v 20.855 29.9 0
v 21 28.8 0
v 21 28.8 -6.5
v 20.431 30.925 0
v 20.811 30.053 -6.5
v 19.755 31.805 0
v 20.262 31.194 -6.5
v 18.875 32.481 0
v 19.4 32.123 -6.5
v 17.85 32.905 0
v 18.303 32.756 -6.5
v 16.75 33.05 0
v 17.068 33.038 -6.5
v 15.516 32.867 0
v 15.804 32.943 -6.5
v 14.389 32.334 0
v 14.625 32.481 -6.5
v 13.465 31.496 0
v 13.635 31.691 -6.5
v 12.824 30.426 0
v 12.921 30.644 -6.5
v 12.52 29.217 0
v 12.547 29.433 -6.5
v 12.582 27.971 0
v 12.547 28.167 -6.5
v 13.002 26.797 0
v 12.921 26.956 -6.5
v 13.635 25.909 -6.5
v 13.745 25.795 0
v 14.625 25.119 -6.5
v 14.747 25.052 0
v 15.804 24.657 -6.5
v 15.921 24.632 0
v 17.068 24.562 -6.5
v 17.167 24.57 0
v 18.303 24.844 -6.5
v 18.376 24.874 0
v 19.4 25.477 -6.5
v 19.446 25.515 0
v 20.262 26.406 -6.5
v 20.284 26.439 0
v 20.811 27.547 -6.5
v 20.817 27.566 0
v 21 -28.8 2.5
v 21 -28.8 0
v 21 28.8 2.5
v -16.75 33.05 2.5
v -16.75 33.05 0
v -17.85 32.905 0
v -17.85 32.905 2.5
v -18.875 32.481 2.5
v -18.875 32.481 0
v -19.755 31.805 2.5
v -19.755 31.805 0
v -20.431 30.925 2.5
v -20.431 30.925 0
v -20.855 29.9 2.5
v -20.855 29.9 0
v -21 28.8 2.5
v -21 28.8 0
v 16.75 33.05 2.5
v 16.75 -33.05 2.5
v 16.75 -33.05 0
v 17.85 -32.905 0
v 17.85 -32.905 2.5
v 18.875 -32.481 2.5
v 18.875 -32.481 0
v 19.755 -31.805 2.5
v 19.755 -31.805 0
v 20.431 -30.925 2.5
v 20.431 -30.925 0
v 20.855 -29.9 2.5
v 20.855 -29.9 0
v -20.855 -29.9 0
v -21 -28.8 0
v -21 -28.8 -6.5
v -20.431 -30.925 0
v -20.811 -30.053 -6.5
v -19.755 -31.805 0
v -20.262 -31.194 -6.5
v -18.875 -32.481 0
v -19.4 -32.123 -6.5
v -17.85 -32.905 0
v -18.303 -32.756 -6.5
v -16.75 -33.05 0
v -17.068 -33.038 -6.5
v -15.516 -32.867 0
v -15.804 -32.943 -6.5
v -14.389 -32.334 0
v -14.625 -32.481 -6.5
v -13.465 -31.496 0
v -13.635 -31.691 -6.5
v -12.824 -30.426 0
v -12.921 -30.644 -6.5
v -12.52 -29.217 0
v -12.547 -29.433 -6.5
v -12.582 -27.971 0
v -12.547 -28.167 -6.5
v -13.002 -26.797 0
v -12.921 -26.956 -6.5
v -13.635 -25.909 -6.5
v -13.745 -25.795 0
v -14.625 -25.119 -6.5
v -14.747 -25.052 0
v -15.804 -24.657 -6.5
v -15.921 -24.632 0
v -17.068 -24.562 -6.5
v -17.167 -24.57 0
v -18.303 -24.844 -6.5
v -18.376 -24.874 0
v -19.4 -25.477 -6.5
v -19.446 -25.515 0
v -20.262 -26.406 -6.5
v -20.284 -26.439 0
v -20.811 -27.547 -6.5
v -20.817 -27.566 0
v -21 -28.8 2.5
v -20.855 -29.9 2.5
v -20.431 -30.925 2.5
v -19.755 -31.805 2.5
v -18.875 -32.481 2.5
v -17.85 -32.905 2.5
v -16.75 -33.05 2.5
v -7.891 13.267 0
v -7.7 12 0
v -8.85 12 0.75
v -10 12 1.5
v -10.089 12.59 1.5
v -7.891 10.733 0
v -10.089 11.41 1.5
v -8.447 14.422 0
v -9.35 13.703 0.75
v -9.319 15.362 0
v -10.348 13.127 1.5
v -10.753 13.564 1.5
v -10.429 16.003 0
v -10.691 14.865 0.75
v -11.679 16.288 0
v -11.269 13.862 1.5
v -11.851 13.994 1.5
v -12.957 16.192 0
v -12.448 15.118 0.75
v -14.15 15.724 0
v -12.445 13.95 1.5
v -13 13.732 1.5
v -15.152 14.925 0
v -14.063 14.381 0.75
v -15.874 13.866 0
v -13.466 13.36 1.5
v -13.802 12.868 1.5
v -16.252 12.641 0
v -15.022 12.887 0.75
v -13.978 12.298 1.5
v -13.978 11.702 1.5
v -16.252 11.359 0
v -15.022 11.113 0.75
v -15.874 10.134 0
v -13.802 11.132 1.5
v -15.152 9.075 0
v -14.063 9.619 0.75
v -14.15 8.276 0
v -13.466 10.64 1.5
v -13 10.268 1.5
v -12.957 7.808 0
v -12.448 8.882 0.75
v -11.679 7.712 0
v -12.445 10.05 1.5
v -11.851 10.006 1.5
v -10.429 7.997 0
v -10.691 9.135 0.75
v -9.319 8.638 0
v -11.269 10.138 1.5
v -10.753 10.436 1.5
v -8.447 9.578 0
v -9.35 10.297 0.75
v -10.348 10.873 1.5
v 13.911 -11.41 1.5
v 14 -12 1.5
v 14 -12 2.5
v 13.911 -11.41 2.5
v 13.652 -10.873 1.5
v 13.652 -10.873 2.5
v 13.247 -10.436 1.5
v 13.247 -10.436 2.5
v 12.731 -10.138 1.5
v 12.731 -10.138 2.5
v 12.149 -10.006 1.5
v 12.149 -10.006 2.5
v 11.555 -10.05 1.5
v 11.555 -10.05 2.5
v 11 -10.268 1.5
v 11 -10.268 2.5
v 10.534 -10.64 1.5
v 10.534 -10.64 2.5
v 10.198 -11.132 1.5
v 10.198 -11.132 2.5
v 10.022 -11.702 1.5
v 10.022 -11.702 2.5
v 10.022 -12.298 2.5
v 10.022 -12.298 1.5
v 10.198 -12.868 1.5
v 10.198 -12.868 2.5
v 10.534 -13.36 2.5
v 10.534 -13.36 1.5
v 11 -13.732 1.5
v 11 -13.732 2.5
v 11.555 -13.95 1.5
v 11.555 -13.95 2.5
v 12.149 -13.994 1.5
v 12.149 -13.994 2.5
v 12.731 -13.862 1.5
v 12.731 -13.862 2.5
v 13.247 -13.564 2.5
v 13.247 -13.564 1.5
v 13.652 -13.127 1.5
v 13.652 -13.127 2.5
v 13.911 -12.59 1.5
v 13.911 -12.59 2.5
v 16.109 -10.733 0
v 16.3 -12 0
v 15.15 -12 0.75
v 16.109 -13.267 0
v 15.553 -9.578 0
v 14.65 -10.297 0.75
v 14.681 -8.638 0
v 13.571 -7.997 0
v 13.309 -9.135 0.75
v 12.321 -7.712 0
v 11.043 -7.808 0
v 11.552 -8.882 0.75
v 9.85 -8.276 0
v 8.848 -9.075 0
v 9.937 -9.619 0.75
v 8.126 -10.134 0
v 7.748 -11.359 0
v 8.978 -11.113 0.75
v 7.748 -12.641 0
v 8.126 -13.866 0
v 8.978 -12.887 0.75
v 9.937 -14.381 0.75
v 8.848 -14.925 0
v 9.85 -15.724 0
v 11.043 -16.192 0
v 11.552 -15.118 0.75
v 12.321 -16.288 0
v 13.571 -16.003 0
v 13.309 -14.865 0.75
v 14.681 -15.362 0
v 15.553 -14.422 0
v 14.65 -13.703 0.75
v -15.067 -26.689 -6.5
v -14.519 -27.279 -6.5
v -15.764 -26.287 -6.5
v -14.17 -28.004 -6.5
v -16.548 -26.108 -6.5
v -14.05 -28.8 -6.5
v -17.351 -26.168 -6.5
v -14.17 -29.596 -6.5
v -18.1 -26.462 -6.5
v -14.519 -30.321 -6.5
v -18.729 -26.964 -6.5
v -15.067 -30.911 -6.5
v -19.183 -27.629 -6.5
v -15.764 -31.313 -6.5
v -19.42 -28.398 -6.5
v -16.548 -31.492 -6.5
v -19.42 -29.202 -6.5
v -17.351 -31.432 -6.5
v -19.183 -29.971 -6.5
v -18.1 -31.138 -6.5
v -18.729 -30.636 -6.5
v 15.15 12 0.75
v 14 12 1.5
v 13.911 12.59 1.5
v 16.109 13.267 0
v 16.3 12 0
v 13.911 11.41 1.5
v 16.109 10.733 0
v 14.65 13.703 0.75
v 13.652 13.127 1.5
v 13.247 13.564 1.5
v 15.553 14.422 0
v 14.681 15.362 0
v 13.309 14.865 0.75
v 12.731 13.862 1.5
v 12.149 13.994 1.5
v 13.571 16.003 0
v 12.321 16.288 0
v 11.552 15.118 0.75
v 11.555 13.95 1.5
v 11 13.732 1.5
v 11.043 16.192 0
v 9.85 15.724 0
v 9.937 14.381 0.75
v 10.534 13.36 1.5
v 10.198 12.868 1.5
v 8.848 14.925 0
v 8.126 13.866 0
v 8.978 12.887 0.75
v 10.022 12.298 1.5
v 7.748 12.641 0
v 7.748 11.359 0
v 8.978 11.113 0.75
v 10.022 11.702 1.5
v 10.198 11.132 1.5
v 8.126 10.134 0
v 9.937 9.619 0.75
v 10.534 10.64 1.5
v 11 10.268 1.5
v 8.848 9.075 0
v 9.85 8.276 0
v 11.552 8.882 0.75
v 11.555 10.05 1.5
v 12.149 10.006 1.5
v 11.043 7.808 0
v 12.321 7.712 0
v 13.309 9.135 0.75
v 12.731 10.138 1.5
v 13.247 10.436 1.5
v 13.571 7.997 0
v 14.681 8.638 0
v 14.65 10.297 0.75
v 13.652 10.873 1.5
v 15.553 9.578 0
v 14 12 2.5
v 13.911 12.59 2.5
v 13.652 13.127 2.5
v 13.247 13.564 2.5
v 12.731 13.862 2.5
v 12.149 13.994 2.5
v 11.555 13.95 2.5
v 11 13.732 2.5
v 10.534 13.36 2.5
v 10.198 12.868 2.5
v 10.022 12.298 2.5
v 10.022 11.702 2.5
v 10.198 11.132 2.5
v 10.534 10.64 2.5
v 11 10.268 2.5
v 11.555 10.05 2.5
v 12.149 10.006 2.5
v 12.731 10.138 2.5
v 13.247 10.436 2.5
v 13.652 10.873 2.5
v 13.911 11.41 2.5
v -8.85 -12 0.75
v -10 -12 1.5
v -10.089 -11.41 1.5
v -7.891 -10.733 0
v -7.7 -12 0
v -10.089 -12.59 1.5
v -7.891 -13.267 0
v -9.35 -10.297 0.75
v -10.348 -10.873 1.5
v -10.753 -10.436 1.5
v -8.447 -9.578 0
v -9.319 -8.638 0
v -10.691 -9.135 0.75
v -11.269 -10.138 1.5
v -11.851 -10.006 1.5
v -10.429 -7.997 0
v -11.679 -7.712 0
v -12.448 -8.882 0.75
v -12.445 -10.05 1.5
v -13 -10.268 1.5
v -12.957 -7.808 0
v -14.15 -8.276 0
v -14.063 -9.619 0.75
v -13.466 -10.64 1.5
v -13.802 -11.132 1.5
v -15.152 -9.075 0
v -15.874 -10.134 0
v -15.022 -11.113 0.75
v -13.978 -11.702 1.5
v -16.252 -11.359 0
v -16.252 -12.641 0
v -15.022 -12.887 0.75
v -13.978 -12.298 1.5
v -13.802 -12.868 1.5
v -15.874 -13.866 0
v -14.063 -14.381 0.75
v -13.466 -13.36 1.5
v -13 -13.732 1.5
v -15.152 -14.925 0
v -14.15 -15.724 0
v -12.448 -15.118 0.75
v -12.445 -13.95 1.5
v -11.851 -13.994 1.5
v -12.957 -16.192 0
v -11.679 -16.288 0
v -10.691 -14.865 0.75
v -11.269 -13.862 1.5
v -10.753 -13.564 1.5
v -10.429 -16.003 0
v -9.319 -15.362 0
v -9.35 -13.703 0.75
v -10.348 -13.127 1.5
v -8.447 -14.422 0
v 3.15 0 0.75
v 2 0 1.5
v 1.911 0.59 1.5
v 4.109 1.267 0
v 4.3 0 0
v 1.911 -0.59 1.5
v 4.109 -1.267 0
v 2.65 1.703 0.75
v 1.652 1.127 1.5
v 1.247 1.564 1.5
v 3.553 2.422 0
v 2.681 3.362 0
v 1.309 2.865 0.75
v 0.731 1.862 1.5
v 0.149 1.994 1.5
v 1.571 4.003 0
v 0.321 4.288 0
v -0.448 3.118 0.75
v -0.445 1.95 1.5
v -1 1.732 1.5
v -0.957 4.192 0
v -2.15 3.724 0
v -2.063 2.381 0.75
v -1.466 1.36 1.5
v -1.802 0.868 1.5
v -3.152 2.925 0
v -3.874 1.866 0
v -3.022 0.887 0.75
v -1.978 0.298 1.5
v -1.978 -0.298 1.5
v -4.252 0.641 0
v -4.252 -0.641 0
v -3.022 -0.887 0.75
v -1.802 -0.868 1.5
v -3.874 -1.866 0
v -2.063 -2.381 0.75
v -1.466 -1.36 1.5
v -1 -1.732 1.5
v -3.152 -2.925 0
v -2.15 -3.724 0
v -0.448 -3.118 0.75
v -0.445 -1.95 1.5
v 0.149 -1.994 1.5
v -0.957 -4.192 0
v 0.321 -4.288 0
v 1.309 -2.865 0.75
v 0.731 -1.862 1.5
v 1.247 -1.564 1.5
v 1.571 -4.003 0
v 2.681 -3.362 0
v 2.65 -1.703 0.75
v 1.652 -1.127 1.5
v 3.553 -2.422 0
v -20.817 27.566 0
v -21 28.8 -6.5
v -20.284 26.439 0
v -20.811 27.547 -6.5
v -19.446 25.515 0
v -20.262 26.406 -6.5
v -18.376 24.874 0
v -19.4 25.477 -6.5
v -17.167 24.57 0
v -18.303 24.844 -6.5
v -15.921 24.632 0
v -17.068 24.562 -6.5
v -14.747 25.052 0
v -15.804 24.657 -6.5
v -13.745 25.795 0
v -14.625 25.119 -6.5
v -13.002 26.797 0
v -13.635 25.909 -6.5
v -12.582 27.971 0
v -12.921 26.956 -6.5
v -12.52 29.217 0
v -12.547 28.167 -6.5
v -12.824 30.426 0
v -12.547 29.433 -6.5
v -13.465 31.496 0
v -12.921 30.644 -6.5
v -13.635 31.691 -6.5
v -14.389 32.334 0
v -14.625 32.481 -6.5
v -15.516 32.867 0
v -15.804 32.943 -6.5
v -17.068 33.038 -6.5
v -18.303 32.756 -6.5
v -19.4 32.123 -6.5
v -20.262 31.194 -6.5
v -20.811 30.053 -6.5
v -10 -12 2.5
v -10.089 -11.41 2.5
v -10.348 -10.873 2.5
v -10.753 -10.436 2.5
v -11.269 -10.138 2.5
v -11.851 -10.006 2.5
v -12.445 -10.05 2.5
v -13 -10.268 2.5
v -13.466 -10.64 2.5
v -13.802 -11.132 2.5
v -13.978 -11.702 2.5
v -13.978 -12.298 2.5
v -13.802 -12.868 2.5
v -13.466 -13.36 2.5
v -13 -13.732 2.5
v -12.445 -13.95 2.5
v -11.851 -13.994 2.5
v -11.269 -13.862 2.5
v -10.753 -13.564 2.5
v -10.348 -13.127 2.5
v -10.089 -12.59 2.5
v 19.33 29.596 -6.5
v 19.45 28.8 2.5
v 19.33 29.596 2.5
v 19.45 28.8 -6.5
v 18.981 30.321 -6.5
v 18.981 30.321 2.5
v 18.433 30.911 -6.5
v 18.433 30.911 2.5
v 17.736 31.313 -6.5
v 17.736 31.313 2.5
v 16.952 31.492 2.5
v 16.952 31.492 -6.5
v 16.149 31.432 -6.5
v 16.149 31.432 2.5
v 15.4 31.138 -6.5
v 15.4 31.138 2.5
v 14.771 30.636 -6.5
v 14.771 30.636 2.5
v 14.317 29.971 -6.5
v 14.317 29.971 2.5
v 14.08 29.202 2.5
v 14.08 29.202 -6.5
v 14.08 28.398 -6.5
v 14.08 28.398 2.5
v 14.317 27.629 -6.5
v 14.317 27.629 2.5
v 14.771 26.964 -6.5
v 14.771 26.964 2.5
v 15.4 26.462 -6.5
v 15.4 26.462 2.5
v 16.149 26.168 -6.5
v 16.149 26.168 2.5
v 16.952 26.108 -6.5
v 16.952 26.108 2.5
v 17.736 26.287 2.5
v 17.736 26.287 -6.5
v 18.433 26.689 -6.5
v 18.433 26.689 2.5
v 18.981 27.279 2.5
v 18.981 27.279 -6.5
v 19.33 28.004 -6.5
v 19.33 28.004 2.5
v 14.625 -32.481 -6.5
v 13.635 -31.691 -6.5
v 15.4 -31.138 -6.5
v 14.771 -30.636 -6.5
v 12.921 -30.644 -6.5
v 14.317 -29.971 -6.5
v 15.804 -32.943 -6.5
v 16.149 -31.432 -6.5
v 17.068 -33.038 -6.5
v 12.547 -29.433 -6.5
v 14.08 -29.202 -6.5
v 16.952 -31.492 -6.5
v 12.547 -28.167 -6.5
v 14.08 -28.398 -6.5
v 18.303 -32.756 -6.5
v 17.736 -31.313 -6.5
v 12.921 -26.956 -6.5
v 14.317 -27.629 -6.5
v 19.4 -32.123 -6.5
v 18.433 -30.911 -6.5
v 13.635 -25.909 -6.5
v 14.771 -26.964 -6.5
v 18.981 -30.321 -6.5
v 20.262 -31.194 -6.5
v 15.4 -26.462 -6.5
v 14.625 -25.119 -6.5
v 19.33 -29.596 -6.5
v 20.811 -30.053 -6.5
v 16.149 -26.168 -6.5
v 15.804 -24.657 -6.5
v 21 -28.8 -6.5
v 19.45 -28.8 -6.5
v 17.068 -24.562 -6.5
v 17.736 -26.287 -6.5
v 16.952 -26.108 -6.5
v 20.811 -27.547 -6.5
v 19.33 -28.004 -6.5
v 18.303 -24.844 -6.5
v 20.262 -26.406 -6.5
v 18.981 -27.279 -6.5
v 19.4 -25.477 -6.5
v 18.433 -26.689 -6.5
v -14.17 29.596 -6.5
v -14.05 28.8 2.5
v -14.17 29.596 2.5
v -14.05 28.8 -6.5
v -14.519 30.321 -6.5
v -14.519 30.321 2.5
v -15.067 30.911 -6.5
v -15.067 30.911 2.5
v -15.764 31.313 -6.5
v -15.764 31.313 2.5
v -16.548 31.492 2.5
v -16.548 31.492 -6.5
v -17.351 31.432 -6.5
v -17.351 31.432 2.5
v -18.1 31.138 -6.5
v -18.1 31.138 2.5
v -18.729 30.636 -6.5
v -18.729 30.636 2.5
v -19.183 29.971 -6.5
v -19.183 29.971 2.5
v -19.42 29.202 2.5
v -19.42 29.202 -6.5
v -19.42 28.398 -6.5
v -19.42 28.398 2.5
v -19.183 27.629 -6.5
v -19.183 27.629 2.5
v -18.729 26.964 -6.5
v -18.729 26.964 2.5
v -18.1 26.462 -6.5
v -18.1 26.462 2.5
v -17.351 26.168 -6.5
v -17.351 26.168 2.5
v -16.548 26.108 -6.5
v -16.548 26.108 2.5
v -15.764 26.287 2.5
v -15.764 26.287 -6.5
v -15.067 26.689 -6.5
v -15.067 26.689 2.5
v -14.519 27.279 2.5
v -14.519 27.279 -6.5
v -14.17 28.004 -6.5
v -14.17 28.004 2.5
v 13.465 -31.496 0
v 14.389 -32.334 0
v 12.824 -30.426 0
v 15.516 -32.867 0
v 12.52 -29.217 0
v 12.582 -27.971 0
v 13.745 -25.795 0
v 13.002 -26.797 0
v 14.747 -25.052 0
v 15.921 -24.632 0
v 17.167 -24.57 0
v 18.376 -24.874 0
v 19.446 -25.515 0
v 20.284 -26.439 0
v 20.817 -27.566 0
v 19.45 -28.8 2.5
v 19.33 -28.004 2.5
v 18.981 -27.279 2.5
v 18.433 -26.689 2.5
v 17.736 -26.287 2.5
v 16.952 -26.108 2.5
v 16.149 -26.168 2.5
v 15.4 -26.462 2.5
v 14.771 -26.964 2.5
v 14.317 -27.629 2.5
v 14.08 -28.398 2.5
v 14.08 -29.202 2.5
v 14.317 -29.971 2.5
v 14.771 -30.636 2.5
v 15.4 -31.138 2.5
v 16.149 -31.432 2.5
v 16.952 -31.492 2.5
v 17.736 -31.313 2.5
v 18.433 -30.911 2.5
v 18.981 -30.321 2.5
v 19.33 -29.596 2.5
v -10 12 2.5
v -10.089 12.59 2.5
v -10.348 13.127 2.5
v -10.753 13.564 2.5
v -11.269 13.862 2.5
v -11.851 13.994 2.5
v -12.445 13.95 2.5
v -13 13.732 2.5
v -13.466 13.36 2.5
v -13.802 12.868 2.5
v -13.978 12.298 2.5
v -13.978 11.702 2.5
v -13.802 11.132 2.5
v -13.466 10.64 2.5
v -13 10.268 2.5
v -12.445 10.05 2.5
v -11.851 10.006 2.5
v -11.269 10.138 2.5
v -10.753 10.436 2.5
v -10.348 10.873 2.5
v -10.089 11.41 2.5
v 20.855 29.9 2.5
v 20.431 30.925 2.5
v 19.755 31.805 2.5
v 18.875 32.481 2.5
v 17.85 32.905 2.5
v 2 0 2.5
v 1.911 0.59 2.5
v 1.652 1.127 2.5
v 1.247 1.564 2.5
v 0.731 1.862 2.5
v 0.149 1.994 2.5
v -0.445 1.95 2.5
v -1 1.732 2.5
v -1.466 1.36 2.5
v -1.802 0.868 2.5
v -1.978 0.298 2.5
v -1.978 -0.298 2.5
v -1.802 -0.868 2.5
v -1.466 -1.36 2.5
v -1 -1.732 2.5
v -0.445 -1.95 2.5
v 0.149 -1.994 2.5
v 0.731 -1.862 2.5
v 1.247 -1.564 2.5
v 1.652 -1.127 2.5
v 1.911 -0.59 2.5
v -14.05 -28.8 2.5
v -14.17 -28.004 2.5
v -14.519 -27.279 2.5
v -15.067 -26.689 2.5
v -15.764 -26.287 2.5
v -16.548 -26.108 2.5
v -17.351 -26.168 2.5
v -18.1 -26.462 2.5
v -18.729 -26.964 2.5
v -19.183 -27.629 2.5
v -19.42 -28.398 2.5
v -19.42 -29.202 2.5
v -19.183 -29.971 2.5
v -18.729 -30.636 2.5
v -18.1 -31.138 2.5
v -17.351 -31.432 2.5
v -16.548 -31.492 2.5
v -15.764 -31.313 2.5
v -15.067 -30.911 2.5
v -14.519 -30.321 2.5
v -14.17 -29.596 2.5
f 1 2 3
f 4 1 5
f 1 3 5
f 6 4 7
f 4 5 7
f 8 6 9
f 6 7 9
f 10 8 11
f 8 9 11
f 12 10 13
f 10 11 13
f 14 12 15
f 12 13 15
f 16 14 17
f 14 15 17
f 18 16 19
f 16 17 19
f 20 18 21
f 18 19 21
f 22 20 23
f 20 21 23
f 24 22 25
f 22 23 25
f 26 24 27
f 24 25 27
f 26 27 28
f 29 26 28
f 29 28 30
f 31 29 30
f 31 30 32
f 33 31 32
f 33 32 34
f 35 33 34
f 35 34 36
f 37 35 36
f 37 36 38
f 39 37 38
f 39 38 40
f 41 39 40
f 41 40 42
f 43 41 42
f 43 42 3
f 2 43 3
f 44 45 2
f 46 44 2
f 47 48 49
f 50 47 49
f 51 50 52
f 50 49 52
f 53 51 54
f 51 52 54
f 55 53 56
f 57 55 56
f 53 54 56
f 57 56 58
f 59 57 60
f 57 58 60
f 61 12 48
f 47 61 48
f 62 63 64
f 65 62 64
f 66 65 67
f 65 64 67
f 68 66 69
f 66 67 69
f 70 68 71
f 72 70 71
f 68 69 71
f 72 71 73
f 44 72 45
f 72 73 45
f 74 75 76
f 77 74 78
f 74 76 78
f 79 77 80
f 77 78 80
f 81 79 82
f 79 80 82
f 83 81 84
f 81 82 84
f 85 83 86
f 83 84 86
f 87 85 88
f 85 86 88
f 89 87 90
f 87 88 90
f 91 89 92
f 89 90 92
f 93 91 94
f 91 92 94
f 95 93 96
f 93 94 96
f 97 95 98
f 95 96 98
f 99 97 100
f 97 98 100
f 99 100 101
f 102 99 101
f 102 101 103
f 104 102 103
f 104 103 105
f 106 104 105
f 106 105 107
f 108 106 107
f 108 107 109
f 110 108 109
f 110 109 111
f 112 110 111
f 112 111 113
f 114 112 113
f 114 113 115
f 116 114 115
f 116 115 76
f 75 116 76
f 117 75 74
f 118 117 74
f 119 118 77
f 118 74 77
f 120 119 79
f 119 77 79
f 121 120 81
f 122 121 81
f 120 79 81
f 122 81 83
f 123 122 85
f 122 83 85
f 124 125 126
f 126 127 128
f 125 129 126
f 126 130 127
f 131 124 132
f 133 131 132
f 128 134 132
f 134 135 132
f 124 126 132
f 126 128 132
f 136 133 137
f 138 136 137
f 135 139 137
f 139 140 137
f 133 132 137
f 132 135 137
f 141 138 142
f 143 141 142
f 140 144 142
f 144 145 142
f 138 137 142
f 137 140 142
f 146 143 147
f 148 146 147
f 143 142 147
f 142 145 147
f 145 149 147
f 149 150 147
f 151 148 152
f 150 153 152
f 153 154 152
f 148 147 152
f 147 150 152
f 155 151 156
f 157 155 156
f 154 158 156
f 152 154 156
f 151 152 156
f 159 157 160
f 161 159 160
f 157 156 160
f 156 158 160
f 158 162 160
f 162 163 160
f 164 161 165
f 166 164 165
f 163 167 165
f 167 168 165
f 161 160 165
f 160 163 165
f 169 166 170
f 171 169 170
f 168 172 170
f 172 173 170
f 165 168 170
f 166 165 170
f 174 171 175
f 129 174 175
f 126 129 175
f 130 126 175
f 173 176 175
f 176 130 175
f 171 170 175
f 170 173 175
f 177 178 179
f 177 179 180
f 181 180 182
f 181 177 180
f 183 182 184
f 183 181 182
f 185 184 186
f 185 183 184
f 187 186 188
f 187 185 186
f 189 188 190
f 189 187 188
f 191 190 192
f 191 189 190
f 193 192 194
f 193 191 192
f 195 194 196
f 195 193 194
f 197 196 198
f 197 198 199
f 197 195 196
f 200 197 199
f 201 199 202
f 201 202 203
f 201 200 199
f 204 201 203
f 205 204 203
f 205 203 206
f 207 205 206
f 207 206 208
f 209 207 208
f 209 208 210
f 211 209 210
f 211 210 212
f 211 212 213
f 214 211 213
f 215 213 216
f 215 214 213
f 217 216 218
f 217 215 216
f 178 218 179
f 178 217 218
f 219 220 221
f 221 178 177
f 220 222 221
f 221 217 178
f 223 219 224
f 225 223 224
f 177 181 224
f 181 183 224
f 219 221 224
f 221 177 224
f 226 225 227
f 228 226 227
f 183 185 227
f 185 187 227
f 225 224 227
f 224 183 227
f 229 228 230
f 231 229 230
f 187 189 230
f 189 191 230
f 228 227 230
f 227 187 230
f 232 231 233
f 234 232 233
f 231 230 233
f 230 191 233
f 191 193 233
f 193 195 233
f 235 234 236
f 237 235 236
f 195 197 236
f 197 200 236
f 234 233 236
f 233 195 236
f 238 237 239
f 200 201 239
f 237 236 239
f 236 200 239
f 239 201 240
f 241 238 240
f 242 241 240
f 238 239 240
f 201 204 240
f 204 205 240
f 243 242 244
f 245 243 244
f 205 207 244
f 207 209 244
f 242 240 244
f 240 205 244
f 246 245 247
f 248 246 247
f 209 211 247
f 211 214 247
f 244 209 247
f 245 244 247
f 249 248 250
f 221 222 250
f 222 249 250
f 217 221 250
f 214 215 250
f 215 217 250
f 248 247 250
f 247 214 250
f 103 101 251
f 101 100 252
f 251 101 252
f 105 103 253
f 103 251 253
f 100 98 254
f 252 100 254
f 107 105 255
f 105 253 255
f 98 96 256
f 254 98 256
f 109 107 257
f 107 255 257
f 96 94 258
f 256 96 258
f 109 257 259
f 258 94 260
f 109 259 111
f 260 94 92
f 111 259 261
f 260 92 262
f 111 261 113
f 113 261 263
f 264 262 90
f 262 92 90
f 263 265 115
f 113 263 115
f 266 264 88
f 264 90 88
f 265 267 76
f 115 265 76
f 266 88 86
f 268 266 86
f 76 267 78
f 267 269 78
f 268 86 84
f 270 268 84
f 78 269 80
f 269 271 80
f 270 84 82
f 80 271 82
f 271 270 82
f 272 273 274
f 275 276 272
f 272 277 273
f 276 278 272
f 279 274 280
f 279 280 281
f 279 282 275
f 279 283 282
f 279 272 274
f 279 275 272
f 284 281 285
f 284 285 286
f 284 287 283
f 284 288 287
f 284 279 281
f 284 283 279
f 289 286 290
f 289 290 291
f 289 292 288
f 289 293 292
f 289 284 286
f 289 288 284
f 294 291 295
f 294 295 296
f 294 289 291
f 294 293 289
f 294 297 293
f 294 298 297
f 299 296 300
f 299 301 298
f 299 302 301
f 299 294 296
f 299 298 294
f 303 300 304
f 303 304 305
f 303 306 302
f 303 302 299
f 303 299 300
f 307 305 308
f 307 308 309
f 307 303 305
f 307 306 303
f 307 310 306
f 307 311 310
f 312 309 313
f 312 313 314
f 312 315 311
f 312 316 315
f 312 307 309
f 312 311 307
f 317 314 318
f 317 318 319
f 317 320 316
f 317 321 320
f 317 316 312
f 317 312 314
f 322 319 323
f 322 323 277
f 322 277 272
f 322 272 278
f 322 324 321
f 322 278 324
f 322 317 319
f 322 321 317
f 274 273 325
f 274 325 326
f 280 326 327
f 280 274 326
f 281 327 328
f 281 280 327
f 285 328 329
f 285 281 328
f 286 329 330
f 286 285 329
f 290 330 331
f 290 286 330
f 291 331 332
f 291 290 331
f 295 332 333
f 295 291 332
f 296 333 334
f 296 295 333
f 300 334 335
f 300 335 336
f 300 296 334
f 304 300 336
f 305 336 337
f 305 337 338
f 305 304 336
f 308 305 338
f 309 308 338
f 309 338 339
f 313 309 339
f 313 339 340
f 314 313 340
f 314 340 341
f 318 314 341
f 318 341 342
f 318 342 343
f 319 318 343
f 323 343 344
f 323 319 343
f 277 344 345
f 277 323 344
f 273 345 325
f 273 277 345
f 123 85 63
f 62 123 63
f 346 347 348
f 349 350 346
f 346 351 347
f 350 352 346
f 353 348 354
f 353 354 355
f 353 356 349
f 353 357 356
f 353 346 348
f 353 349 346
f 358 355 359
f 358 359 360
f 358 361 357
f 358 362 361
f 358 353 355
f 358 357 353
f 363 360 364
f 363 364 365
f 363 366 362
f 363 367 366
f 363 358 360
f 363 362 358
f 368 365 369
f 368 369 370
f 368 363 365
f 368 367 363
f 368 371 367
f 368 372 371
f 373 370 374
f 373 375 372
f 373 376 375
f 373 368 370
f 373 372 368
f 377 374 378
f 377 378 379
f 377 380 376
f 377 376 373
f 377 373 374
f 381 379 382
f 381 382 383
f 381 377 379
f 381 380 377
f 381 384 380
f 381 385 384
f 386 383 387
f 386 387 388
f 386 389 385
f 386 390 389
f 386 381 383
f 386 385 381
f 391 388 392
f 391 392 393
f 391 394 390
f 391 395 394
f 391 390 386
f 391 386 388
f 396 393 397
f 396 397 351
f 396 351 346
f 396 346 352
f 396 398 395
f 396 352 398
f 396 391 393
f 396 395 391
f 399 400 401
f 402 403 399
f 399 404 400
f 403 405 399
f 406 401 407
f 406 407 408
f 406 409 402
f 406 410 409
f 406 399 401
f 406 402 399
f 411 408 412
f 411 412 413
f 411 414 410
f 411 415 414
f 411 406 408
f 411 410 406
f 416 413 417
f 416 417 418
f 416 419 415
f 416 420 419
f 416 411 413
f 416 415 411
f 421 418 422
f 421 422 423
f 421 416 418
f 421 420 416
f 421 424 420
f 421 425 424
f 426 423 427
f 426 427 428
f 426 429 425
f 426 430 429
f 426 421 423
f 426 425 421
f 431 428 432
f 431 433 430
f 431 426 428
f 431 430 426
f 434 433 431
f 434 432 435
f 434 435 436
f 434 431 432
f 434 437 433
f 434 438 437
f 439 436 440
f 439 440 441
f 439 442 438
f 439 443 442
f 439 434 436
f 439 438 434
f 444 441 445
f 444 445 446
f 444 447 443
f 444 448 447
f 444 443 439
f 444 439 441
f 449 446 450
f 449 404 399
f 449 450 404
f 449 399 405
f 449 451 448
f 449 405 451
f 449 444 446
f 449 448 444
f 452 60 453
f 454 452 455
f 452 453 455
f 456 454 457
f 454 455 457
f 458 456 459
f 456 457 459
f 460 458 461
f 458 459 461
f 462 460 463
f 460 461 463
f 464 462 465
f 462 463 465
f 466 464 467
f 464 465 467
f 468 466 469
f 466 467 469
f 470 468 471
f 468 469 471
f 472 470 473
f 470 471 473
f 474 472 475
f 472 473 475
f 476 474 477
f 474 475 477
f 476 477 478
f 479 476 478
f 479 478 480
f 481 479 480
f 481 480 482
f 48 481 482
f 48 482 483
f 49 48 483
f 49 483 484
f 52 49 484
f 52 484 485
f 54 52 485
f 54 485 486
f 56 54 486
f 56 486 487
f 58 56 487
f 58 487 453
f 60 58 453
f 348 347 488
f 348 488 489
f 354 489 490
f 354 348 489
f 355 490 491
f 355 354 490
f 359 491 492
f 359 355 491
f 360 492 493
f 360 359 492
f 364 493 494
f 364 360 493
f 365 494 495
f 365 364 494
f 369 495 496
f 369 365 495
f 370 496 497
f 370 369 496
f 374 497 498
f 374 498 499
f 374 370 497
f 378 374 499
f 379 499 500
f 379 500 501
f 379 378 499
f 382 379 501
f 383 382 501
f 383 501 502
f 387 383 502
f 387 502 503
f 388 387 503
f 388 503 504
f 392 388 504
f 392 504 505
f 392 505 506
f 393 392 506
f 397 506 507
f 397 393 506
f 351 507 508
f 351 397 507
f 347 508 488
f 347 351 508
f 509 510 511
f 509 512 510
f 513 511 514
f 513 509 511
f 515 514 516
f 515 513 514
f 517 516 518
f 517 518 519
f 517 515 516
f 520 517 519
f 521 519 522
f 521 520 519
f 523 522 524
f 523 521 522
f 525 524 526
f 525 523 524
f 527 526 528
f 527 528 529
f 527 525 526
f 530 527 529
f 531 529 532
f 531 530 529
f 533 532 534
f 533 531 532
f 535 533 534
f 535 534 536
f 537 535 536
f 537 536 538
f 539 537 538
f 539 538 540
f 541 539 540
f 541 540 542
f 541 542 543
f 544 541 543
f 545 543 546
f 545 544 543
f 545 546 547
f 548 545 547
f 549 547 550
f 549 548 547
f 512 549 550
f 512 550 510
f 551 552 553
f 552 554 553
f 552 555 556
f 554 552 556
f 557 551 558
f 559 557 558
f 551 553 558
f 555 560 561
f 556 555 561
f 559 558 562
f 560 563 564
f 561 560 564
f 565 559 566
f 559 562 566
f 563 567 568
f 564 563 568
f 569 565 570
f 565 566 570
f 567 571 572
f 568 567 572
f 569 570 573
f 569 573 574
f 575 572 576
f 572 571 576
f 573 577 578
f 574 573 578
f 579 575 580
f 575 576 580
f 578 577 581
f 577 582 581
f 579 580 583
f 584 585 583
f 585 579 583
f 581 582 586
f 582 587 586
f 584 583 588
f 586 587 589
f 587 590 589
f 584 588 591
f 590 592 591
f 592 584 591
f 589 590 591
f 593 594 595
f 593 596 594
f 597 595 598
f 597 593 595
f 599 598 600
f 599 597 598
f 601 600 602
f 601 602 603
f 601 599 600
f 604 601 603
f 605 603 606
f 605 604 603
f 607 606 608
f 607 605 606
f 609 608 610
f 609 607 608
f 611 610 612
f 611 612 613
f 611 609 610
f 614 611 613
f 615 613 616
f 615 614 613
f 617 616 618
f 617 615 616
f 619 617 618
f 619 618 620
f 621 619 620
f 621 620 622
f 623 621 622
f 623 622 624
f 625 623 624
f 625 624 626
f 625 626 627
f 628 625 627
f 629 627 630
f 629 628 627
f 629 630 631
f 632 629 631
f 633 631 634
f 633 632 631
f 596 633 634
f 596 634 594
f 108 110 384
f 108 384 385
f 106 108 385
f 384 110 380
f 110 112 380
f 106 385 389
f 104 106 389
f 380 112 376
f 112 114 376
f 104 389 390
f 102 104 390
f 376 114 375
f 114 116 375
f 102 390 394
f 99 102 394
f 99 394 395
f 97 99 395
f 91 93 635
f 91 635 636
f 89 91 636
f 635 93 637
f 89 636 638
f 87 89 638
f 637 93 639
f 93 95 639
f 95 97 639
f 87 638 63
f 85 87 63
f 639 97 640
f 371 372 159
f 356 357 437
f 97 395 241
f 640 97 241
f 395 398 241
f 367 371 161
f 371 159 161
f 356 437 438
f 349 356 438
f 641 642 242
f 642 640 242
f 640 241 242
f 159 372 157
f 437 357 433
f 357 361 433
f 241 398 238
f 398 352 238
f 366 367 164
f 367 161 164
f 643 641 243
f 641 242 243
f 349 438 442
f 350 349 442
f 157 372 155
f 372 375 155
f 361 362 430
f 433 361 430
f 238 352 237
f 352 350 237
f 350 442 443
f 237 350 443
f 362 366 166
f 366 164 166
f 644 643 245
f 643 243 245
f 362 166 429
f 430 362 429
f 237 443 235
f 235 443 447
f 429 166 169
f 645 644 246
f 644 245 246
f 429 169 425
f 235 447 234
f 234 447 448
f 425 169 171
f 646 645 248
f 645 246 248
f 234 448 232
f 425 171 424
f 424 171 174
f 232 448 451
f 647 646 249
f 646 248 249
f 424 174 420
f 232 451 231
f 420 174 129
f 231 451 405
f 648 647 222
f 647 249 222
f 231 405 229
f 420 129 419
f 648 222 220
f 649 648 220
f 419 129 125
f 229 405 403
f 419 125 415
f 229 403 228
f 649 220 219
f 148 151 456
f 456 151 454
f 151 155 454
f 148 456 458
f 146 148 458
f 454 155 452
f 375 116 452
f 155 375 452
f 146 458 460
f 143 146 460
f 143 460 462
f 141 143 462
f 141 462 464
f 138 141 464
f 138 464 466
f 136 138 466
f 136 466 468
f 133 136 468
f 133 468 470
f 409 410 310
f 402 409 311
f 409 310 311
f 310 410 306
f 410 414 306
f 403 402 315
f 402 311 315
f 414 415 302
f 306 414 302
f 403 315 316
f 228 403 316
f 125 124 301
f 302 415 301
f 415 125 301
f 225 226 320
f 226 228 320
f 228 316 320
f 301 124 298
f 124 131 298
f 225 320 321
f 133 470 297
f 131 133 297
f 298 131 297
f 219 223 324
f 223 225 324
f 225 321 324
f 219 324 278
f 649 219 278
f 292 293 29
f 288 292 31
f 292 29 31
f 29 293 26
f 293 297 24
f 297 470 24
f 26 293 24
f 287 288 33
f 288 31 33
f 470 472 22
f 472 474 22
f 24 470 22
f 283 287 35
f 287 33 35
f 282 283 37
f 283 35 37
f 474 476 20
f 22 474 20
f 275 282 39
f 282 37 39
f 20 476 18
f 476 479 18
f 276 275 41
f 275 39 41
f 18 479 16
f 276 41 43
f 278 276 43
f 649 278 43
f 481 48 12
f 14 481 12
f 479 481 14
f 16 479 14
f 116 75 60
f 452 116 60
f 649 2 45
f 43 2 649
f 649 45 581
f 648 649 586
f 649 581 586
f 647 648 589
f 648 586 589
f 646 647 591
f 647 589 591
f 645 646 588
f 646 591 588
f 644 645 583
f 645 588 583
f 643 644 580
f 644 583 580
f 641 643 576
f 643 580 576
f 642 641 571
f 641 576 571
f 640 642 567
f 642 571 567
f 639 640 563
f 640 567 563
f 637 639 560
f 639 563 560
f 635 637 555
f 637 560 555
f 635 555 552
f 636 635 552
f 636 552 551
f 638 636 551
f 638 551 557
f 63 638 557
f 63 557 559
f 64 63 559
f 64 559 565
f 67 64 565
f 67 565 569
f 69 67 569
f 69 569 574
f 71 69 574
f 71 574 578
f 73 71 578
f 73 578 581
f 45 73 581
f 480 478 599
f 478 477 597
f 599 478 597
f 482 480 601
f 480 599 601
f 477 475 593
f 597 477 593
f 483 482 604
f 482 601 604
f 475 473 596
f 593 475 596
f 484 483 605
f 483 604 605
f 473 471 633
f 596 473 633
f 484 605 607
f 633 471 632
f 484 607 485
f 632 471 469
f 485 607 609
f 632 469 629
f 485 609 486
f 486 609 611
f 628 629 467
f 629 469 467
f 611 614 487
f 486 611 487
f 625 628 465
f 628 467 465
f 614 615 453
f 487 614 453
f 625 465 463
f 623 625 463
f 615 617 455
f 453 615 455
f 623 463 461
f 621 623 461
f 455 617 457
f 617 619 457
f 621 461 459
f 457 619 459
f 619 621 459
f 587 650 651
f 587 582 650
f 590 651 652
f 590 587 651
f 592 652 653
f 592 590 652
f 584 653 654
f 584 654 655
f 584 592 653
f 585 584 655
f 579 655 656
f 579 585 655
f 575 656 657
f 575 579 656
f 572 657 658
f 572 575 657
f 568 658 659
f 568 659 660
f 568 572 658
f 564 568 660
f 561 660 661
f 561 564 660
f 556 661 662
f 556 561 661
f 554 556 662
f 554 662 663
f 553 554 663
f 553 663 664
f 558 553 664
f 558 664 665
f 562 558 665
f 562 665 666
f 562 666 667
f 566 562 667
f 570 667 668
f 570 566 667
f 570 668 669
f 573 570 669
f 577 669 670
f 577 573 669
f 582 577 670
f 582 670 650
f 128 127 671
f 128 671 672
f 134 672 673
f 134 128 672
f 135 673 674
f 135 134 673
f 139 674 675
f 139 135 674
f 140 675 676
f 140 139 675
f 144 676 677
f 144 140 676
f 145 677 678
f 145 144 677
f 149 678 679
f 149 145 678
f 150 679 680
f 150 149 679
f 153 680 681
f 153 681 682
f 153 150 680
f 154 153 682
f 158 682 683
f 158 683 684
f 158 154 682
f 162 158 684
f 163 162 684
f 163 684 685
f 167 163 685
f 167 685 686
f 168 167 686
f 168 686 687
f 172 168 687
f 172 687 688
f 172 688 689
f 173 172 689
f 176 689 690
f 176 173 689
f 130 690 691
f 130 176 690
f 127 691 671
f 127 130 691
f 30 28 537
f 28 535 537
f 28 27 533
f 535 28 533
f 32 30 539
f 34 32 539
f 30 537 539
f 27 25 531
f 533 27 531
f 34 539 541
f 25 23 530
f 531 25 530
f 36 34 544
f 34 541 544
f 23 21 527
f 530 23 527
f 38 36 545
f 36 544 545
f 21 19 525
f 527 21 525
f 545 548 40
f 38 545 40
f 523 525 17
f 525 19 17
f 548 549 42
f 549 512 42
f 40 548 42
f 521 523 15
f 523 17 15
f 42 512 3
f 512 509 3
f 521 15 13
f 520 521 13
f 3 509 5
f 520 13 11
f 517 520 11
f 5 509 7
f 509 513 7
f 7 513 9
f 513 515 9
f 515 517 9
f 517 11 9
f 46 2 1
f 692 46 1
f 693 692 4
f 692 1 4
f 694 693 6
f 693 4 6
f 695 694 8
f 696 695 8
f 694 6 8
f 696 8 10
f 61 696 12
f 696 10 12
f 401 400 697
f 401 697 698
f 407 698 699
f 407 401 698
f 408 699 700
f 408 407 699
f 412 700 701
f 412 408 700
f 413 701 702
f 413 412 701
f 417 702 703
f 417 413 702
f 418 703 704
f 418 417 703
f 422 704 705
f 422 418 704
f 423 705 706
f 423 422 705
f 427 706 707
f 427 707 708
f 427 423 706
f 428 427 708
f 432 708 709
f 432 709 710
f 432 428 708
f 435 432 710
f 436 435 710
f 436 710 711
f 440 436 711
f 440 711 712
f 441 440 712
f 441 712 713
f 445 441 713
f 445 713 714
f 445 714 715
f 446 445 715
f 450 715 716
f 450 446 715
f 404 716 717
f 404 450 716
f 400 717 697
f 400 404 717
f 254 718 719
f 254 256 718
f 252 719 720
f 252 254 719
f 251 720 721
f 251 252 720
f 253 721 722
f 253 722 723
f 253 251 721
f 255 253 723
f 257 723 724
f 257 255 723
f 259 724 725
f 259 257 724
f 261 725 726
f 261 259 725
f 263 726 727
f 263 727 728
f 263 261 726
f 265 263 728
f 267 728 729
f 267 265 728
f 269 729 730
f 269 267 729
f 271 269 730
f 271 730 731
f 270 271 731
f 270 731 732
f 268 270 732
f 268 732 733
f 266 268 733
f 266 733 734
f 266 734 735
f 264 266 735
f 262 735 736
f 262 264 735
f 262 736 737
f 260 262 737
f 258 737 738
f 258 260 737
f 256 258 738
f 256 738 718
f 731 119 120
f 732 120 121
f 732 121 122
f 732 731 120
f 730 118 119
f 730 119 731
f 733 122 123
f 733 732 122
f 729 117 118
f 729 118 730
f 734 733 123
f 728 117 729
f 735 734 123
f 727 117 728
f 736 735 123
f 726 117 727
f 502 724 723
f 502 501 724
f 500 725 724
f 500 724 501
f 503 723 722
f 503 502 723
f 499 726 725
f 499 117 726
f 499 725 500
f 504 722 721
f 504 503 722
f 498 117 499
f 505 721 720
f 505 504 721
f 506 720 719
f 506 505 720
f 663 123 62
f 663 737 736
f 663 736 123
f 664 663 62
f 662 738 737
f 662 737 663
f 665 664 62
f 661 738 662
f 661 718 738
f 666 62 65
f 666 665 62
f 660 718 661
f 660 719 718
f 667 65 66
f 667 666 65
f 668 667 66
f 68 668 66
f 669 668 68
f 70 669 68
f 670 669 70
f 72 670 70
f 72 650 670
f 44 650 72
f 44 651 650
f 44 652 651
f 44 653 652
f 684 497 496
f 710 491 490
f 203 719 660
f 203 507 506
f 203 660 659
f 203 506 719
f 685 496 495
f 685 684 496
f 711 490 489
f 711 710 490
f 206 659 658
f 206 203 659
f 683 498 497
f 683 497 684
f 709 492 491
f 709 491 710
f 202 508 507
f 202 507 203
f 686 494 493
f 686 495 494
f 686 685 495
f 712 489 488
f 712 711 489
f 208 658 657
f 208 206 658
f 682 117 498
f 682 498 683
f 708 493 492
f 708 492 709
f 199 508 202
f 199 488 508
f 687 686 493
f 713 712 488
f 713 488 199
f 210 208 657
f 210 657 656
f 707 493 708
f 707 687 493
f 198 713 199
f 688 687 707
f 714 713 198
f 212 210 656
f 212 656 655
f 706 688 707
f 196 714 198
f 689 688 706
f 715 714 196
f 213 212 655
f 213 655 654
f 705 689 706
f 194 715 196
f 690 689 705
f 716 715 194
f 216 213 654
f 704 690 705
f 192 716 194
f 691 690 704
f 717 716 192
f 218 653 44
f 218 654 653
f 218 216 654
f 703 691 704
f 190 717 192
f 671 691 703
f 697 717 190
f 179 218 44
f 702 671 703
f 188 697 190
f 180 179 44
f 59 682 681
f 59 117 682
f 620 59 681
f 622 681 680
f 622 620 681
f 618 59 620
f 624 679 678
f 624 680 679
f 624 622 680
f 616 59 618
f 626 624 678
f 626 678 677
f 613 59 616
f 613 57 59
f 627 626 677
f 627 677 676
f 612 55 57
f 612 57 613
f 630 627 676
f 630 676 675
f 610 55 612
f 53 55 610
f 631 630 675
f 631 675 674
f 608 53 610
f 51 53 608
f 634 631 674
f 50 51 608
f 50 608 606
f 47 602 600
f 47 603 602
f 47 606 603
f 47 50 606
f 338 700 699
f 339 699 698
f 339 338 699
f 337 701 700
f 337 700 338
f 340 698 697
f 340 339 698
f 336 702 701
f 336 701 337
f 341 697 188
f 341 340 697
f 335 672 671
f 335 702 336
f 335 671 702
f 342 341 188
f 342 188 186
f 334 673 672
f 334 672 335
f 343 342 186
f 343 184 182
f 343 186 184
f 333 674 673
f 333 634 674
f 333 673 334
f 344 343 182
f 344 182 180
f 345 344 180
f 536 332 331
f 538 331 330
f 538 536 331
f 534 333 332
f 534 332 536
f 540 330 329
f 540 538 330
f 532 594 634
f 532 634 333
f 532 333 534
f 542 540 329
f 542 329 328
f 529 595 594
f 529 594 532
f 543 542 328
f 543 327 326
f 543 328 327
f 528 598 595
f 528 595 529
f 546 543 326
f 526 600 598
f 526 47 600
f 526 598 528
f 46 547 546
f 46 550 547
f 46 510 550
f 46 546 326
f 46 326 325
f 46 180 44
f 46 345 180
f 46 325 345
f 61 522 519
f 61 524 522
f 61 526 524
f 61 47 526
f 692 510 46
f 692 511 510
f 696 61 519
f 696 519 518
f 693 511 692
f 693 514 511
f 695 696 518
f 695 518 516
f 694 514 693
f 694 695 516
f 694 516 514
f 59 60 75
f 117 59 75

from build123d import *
from OCP.BRepFilletAPI import BRepFilletAPI_MakeChamfer
from build123d.topology import SkipClean

# Parameters (mm, degrees)
SKETCH_1_R      = 2
SKETCH_1_R_2    = 2.7
EXTRUDE_1_DEPTH = 2.5
EXTRUDE_START   = -6.5
SKETCH_1_3_R    = 4.25
SKETCH_1_3_R_2  = 2.7
EXTRUDE_2_DEPTH = 6.5
CHAMFER_1_SIZE  = 2.3
CHAMFER_1_SIZE2 = 1.5
CHAMFER_2_SIZE  = 1.5
CHAMFER_2_SIZE2 = 2.3


with BuildPart() as part:
    # 草图1 → 凸台-拉伸1 (new body)
    with BuildSketch(Plane.XY):
        with BuildLine():
            ThreePointArc((-16.75, 33.05), (-19.75520382, 31.80520382), (-21, 28.8))
            Line((-21, 28.8), (-21, -28.8))
            ThreePointArc((-21, -28.8), (-19.75520382, -31.80520382), (-16.75, -33.05))
            Line((-16.75, -33.05), (16.75, -33.05))
            ThreePointArc((16.75, -33.05), (19.75520382, -31.80520382), (21, -28.8))
            Line((21, -28.8), (21, 28.8))
            ThreePointArc((21, 28.8), (19.75520382, 31.80520382), (16.75, 33.05))
            Line((16.75, 33.05), (-16.75, 33.05))
        make_face()
        with Locations((-12, 12)):
            Circle(SKETCH_1_R, mode=Mode.SUBTRACT)
        with Locations((12, 12)):
            Circle(SKETCH_1_R, mode=Mode.SUBTRACT)
        with Locations((12, -12)):
            Circle(SKETCH_1_R, mode=Mode.SUBTRACT)
        with Locations((-12, -12)):
            Circle(SKETCH_1_R, mode=Mode.SUBTRACT)
        Circle(SKETCH_1_R, mode=Mode.SUBTRACT)
        with Locations((-16.75, 28.8)):
            Circle(SKETCH_1_R_2, mode=Mode.SUBTRACT)
        with Locations((16.75, 28.8)):
            Circle(SKETCH_1_R_2, mode=Mode.SUBTRACT)
        with Locations((16.75, -28.8)):
            Circle(SKETCH_1_R_2, mode=Mode.SUBTRACT)
        with Locations((-16.75, -28.8)):
            Circle(SKETCH_1_R_2, mode=Mode.SUBTRACT)
    extrude(amount=EXTRUDE_1_DEPTH)

    # 草图1<3> → 凸台-拉伸2 (add)
    # profile 1 of 4: a face of its own
    with SkipClean():  # the faces are left unmerged after this step: merging them gives an invalid solid
        with BuildSketch(Plane.XY.offset(EXTRUDE_START)):
            with Locations((-16.75, 28.8)):
                Circle(SKETCH_1_3_R)
            with Locations((-16.75, 28.8)):
                Circle(SKETCH_1_3_R_2, mode=Mode.SUBTRACT)
        # profile 2 of 4: a face of its own
        with BuildSketch(Plane.XY.offset(EXTRUDE_START)):
            with Locations((-16.75, -28.8)):
                Circle(SKETCH_1_3_R)
            with Locations((-16.75, -28.8)):
                Circle(SKETCH_1_3_R_2, mode=Mode.SUBTRACT)
        # profile 3 of 4: a face of its own
        with BuildSketch(Plane.XY.offset(EXTRUDE_START)):
            with Locations((16.75, 28.8)):
                Circle(SKETCH_1_3_R)
            with Locations((16.75, 28.8)):
                Circle(SKETCH_1_3_R_2, mode=Mode.SUBTRACT)
        # profile 4 of 4: a face of its own
        with BuildSketch(Plane.XY.offset(EXTRUDE_START)):
            with Locations((16.75, -28.8)):
                Circle(SKETCH_1_3_R)
            with Locations((16.75, -28.8)):
                Circle(SKETCH_1_3_R_2, mode=Mode.SUBTRACT)
        extrude(amount=EXTRUDE_2_DEPTH)

    # 倒角1
    chamfer_1_edges = [part.edges().sort_by_distance(p)[0] for p in [
        (10, -12, 0),
        (-14, 12, 0),
    ]]
    chamfer_1_side = [part.faces().sort_by_distance(p)[0] for p in [
        (0, 32.266851866, 0),
    ]]
    chamfer(chamfer_1_edges, length=CHAMFER_1_SIZE, length2=CHAMFER_1_SIZE2, reference=chamfer_1_side[0])

    # 倒角2: one chamfer whose edges measure the first distance from different faces: ONE call of the kernel's chamfer builder (chamfer() names one face for all edges)
    chamfer_2_edges_1 = [part.edges().sort_by_distance(p)[0] for p in [
        (10, 12, 0),
    ]]
    chamfer_2_side_1 = [part.faces().sort_by_distance(p)[0] for p in [
        (10, 12, 1.25),
    ]]
    chamfer_2_edges_2 = [part.edges().sort_by_distance(p)[0] for p in [
        (-2, 0, 0),
    ]]
    chamfer_2_side_2 = [part.faces().sort_by_distance(p)[0] for p in [
        (-2, 0, 1.25),
    ]]
    chamfer_2_edges_3 = [part.edges().sort_by_distance(p)[0] for p in [
        (-14, -12, 0),
    ]]
    chamfer_2_side_3 = [part.faces().sort_by_distance(p)[0] for p in [
        (-14, -12, 1.25),
    ]]
    chamfer_2 = BRepFilletAPI_MakeChamfer(part.part.solid().wrapped)
    for e in chamfer_2_edges_1:
        chamfer_2.Add(CHAMFER_2_SIZE, CHAMFER_2_SIZE2, e.wrapped, chamfer_2_side_1[0].wrapped)  # the first distance lies on this face
    for e in chamfer_2_edges_2:
        chamfer_2.Add(CHAMFER_2_SIZE, CHAMFER_2_SIZE2, e.wrapped, chamfer_2_side_2[0].wrapped)  # the first distance lies on this face
    for e in chamfer_2_edges_3:
        chamfer_2.Add(CHAMFER_2_SIZE, CHAMFER_2_SIZE2, e.wrapped, chamfer_2_side_3[0].wrapped)  # the first distance lies on this face
    add(Compound.cast(chamfer_2.Shape()), mode=Mode.REPLACE)


solid = part.part
